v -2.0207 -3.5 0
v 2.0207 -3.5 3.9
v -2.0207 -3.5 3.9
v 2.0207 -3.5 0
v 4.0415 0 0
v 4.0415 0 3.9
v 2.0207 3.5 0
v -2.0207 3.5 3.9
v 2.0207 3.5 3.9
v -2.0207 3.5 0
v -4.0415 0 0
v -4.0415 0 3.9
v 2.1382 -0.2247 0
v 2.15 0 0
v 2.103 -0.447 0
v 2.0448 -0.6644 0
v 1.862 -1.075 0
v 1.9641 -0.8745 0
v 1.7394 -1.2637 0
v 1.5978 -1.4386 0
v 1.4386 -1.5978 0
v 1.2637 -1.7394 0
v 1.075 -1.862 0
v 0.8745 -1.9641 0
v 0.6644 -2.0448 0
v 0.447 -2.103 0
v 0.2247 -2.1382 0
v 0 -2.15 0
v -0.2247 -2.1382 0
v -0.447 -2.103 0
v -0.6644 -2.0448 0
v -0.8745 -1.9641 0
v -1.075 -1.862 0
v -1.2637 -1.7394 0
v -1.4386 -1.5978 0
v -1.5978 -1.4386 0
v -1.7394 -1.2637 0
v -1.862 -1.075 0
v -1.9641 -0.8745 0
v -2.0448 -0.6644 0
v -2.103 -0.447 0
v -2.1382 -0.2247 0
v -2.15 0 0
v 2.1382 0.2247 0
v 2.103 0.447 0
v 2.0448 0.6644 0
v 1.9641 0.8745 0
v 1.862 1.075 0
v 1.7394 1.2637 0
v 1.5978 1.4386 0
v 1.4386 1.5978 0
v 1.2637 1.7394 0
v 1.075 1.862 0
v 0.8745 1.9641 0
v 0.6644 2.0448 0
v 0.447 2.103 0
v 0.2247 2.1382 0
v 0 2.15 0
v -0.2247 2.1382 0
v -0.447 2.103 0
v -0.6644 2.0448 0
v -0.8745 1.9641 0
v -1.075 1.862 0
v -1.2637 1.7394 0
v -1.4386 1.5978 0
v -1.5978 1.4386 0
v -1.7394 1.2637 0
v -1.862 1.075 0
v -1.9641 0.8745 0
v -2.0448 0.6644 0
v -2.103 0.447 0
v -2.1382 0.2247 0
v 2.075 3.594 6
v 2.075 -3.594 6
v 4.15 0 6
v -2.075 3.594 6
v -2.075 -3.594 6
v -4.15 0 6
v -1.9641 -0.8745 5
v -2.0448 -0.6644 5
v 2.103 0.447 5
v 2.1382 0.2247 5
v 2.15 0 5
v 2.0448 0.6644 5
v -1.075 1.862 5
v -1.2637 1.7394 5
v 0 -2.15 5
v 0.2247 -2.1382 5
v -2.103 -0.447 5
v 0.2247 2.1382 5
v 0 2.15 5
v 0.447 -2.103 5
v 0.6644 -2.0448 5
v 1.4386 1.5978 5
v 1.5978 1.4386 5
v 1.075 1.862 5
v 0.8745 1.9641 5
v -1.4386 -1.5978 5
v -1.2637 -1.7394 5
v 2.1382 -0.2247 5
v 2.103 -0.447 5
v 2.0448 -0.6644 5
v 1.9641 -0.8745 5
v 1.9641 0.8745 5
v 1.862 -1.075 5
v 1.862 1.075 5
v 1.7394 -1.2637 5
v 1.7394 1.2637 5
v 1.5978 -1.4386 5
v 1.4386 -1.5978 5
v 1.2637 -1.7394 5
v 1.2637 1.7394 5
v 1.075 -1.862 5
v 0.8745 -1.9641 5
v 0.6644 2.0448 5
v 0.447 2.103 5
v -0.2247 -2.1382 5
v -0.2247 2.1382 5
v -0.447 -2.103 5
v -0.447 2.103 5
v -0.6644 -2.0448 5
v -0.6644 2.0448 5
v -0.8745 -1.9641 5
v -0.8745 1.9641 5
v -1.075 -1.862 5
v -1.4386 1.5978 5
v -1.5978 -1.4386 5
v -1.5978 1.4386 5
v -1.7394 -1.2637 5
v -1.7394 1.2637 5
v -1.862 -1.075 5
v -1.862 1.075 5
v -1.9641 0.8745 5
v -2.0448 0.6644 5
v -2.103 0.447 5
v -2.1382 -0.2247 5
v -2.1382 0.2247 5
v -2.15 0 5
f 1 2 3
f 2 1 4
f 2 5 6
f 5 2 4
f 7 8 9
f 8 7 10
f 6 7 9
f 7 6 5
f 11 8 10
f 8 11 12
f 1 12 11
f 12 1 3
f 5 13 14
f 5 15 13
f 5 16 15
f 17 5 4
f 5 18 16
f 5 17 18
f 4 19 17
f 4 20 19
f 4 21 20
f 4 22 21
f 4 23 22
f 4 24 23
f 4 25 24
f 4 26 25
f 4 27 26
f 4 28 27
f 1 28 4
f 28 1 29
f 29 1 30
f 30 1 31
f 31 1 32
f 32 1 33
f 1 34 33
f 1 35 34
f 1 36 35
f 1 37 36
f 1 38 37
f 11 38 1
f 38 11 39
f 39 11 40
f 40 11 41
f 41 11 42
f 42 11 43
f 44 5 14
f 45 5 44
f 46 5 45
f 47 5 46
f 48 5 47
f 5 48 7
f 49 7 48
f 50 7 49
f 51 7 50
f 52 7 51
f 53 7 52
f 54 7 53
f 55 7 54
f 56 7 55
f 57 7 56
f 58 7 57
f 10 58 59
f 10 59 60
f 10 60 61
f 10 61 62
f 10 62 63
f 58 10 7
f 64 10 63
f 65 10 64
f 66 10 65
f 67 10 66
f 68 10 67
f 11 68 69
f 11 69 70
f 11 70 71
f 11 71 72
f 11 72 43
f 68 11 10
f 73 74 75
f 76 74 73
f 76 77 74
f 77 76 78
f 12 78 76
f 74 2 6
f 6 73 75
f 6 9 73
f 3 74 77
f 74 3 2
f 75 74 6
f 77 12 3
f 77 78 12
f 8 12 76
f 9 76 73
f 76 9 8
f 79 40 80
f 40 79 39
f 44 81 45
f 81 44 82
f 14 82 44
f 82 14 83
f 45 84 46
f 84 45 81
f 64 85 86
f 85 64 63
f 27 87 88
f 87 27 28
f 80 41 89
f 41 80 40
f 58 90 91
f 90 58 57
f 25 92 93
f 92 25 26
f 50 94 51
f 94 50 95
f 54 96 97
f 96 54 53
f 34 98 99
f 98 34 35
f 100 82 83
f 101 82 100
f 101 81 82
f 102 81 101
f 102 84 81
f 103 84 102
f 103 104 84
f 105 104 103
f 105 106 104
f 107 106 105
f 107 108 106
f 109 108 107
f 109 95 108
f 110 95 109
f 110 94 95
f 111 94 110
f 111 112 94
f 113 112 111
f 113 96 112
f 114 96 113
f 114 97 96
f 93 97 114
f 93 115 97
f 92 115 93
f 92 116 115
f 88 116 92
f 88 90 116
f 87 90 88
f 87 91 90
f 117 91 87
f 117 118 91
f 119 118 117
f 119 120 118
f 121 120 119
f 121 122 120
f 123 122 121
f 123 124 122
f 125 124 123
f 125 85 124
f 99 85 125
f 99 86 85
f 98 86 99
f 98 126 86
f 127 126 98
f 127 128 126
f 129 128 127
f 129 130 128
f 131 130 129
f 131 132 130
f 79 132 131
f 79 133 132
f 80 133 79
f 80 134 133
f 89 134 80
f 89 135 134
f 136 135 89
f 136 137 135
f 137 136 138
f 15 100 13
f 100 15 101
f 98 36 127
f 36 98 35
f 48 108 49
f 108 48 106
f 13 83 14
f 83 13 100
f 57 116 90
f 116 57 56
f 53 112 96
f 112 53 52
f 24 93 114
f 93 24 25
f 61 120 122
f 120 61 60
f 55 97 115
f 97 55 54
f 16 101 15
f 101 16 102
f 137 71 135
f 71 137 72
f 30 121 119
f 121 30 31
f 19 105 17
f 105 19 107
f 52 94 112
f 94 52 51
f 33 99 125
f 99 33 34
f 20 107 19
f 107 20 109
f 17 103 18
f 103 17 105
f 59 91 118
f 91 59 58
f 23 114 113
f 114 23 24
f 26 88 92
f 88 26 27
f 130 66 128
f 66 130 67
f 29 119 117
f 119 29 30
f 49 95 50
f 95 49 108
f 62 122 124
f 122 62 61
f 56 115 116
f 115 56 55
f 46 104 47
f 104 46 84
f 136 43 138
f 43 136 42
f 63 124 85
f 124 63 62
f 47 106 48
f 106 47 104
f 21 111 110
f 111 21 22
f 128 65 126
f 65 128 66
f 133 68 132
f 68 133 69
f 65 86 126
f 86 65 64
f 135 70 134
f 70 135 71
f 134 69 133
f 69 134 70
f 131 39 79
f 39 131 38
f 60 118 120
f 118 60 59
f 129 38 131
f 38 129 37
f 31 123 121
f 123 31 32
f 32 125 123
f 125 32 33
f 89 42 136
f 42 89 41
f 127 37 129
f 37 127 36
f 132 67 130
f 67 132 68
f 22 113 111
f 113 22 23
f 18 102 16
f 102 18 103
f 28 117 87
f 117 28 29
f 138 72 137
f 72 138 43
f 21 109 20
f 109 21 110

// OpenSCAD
// Blind cap nut.
$fn = 60;
eps = 0.02;
thread_d = 4.3;
flat = 7;
height = 6;
body_h = height*0.65;
difference() {
    union() {
        cylinder(d=flat/cos(30),h=body_h,$fn=6);
        translate([0,0,body_h]) cylinder(d1=flat/cos(30),d2=thread_d+4,h=height-body_h,$fn=6);
    }
    translate([0,0,-eps]) cylinder(d=thread_d,h=height-1+eps);
}
